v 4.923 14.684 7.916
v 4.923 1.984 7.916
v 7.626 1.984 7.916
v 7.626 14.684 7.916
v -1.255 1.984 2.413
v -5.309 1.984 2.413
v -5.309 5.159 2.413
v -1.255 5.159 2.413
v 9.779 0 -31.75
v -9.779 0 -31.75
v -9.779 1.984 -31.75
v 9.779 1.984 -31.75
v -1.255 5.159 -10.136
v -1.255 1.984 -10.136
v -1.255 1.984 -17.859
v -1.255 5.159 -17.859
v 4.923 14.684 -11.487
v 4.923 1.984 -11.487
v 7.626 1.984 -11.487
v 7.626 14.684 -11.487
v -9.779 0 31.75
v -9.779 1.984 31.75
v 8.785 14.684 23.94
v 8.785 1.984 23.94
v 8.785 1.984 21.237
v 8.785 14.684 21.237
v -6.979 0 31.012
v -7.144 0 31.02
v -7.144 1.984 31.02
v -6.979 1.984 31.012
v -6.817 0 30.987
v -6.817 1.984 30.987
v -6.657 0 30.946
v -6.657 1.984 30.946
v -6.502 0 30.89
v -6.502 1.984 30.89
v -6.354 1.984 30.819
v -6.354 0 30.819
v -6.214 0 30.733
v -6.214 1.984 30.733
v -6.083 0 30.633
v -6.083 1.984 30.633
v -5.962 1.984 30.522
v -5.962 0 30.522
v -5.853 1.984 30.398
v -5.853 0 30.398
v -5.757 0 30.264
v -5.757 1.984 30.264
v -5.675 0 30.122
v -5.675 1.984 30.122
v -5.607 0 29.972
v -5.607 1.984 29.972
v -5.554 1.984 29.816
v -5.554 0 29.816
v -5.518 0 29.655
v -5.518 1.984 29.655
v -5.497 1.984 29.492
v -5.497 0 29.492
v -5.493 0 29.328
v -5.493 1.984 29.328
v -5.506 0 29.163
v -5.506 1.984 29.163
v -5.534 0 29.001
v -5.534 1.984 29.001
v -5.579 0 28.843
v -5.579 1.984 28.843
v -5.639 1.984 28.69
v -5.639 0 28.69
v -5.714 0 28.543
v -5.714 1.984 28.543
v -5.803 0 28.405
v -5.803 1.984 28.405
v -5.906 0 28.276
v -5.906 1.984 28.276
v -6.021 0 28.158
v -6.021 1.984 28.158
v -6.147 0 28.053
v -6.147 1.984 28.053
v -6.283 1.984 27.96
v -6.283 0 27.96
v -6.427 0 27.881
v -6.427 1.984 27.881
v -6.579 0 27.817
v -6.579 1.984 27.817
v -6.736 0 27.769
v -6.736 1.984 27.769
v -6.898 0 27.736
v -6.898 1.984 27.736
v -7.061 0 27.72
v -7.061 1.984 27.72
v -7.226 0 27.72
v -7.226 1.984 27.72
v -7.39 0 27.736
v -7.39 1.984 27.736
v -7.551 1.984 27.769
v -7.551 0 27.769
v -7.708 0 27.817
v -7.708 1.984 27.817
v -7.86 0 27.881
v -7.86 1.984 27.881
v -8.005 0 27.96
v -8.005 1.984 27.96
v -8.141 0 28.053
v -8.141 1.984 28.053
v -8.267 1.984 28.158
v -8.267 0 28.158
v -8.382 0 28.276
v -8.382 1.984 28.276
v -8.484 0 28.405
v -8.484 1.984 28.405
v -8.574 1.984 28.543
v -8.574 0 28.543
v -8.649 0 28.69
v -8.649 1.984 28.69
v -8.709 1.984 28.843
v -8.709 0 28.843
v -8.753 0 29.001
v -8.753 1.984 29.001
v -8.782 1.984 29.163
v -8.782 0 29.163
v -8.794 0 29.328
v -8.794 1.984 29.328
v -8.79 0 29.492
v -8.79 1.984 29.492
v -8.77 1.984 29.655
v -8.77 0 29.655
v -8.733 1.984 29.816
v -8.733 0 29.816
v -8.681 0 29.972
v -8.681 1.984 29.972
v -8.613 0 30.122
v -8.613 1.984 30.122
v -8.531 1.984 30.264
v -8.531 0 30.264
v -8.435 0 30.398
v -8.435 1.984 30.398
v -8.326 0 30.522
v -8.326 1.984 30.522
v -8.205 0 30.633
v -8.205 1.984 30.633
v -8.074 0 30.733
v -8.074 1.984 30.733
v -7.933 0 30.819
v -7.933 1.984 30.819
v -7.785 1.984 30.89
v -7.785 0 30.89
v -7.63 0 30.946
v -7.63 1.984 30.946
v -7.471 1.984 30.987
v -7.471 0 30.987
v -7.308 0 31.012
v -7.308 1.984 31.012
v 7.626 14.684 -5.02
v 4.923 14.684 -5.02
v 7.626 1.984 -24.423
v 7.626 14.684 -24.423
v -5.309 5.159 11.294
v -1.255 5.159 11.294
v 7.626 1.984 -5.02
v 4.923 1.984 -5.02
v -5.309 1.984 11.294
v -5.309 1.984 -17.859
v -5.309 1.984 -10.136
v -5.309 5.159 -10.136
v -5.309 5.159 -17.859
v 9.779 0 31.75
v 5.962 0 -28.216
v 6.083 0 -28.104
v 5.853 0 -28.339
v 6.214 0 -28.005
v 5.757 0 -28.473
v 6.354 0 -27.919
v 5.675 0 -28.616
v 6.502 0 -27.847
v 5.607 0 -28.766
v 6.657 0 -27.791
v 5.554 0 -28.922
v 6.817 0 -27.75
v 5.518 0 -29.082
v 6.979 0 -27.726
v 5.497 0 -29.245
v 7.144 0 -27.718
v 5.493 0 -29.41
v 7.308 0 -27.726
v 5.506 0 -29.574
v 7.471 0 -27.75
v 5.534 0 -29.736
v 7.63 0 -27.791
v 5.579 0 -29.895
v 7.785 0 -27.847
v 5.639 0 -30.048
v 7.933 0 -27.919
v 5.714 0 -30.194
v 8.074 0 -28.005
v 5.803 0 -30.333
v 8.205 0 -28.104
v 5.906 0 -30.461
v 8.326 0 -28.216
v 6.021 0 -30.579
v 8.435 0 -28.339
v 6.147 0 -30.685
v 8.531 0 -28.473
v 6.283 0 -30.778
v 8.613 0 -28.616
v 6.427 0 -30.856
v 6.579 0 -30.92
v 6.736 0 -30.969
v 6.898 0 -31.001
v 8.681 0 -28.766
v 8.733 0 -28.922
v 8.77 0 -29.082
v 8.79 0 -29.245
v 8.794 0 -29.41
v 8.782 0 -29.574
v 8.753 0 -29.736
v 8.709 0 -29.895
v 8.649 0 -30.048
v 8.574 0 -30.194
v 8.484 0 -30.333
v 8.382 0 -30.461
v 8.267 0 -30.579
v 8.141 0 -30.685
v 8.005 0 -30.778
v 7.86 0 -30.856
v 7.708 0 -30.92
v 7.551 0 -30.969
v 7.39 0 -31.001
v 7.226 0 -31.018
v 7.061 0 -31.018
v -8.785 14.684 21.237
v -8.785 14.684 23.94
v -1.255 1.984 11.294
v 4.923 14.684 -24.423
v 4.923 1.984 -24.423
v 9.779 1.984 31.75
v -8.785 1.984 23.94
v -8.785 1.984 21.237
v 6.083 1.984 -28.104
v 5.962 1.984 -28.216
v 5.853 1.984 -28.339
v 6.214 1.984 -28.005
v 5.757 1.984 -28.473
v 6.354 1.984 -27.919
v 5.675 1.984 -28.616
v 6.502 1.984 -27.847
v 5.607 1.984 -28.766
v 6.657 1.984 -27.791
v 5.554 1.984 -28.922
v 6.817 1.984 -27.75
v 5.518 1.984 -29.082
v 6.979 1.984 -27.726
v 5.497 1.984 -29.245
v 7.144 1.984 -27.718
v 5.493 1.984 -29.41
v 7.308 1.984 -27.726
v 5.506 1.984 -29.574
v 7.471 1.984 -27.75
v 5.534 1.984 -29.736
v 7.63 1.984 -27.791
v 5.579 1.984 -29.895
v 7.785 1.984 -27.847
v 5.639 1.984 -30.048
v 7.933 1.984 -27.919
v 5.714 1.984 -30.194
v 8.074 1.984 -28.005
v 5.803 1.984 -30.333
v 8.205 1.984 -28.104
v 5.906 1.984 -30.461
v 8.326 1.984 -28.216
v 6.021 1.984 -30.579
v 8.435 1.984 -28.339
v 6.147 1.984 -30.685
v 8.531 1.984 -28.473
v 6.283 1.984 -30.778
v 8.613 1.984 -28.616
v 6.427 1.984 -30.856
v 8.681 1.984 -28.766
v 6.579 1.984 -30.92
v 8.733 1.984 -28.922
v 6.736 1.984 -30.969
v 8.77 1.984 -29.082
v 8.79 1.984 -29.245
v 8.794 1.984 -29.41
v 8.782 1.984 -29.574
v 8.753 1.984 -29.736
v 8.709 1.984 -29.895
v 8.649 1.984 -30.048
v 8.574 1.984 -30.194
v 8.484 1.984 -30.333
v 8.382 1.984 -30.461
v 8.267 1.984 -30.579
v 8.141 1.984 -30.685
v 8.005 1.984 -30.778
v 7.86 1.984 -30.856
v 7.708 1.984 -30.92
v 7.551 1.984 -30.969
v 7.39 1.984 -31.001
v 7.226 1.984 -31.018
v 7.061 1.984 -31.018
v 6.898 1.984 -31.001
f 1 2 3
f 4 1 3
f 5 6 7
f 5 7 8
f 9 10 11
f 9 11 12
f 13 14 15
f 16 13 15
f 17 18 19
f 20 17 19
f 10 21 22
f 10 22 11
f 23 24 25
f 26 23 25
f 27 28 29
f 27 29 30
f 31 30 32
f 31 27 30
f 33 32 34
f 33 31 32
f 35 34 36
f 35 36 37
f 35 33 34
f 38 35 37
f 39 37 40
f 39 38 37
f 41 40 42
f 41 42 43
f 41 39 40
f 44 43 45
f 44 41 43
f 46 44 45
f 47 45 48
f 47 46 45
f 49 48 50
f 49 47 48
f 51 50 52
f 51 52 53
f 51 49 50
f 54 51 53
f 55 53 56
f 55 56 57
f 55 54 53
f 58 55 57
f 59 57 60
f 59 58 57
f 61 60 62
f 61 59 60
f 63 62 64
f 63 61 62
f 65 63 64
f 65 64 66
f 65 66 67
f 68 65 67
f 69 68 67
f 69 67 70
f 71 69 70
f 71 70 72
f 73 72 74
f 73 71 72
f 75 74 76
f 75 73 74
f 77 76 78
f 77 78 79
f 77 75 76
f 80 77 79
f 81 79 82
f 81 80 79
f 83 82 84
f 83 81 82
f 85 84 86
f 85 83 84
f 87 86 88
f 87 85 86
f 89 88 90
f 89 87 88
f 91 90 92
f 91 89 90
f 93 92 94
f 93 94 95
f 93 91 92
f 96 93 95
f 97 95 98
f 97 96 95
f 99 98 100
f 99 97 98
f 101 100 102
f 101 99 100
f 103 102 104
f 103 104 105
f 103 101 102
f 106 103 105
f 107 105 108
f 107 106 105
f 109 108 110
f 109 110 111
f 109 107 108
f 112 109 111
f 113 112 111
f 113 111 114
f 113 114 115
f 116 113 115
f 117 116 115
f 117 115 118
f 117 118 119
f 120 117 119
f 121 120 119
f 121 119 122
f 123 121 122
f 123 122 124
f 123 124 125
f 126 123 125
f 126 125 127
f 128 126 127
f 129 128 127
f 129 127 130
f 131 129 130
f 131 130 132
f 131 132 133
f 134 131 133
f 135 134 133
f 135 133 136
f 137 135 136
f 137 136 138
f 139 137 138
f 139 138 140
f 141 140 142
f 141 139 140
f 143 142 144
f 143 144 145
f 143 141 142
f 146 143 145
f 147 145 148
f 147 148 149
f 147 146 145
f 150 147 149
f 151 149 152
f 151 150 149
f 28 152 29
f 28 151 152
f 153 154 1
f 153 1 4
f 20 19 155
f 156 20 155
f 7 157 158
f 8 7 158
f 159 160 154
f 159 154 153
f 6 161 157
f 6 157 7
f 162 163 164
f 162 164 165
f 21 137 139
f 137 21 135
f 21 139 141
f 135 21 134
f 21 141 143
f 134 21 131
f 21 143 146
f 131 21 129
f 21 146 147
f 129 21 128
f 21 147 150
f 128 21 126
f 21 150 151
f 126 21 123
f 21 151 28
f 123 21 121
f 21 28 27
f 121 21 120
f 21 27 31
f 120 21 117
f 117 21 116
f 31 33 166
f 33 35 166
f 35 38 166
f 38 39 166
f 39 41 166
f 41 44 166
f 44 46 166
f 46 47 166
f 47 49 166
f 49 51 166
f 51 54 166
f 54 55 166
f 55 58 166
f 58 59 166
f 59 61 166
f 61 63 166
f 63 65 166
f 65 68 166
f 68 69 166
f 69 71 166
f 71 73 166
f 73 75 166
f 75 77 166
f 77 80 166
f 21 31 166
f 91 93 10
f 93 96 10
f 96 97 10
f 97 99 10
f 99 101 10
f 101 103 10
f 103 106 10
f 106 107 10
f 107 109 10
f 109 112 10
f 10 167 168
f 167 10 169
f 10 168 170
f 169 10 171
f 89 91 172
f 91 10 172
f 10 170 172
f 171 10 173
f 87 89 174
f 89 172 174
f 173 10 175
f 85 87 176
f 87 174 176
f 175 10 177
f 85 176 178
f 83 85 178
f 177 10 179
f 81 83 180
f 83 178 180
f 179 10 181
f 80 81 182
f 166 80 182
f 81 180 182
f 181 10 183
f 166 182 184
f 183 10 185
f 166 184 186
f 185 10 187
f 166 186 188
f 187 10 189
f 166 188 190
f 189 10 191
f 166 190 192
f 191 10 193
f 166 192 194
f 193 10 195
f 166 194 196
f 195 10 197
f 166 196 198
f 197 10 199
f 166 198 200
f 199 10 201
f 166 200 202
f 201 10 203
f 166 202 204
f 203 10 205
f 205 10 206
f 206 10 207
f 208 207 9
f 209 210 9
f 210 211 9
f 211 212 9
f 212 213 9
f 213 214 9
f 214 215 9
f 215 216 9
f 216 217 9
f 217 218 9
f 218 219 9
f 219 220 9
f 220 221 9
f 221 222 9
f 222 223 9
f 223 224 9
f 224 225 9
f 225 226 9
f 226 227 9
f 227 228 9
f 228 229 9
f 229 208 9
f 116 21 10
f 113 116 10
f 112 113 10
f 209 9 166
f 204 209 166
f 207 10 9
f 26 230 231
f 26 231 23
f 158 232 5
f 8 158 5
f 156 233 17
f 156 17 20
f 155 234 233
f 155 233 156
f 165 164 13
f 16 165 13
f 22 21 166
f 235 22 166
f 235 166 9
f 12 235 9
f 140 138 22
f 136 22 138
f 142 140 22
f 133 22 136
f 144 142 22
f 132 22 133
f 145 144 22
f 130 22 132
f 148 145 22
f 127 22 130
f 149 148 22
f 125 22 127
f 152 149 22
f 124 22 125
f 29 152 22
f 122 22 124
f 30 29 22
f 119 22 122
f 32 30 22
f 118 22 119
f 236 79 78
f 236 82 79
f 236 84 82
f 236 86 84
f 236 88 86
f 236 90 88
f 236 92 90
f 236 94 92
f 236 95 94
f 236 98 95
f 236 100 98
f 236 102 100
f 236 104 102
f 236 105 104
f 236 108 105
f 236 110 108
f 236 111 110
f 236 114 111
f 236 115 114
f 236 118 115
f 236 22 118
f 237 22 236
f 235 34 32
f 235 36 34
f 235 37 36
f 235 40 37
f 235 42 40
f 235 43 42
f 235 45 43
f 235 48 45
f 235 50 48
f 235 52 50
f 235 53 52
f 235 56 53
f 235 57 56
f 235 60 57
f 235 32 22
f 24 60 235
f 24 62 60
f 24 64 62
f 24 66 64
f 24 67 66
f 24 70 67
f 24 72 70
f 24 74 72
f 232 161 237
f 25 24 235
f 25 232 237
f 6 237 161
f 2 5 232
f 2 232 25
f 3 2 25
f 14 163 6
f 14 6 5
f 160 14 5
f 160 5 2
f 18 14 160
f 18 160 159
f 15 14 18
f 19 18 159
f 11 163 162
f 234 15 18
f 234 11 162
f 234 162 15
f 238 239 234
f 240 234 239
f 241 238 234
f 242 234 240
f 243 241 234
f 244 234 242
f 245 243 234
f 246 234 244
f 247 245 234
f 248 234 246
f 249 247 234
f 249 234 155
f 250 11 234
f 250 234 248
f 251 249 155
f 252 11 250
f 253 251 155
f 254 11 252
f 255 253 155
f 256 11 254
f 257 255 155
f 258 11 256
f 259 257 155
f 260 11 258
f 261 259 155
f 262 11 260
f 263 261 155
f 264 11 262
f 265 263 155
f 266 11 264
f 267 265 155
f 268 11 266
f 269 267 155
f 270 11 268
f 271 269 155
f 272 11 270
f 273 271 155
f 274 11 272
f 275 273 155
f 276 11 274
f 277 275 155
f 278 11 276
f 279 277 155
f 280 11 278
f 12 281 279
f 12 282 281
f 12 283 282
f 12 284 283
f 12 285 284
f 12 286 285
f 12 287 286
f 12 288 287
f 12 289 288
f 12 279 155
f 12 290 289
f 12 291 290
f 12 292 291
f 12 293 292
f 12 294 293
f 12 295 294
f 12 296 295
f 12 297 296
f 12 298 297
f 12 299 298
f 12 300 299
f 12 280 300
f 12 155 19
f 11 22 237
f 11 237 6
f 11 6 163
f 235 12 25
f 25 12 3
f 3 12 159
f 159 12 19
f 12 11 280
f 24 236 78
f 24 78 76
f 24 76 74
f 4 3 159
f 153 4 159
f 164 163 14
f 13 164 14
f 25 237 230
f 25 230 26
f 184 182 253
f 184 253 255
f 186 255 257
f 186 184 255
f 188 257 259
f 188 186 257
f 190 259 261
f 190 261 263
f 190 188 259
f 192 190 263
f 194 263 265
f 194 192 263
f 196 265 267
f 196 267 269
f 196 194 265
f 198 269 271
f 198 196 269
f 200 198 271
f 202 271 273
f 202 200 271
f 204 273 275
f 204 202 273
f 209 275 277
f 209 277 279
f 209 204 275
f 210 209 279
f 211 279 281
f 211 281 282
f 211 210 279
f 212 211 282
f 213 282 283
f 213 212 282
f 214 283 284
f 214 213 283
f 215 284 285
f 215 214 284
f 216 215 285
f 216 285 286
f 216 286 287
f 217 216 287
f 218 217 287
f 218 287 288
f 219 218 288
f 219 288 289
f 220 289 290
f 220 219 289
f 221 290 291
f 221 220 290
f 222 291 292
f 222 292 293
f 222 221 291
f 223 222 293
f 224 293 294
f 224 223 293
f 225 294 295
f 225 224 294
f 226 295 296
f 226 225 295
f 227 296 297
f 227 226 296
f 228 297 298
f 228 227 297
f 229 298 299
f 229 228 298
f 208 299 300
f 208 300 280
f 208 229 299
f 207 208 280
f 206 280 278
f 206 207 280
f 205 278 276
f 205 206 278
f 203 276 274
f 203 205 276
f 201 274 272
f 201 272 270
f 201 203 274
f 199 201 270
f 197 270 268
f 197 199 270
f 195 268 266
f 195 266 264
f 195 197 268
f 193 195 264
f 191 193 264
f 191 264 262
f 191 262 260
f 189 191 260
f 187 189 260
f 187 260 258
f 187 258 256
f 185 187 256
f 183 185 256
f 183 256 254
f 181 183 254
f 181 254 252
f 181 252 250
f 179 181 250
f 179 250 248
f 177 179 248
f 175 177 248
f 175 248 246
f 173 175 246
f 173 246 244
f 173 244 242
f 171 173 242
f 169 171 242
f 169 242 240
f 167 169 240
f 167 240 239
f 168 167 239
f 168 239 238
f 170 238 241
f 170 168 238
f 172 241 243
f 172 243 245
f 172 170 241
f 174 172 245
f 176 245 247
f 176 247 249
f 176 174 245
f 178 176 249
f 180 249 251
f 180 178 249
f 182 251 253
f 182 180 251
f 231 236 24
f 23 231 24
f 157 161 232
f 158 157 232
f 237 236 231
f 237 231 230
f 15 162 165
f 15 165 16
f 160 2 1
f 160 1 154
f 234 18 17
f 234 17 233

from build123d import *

# Parameters (mm, degrees)
SKETCH1_W           = 19.558
SKETCH1_H           = 63.5
SKETCH1_R           = 1.651
BOSS_EXTRUDE1_DEPTH = 1.984375
SKETCH2_W           = 17.569023062
SKETCH2_H           = 2.702926625
SKETCH2_W_2         = 2.702926625
SKETCH2_H_2         = 12.935434562
BOSS_EXTRUDE3_DEPTH = 12.7
SKETCH2_3_W         = 4.054389937
SKETCH2_3_H         = 7.7226475
SKETCH2_3_H_2       = 8.881044625
BOSS_EXTRUDE4_DEPTH = 3.175


with BuildPart() as part:
    # Sketch1 → Boss-Extrude1 (new body)
    with BuildSketch(Plane(origin=(0, 0, 0), x_dir=(1, 0, 0), z_dir=(0, 1, 0))):
        Rectangle(SKETCH1_W, SKETCH1_H)
        with Locations((7.14375, 29.36875)):
            Circle(SKETCH1_R, mode=Mode.SUBTRACT)
        with Locations((-7.14375, -29.36875)):
            Circle(SKETCH1_R, mode=Mode.SUBTRACT)
    extrude(amount=BOSS_EXTRUDE1_DEPTH)

    # Sketch2 → Boss-Extrude3 (add)
    with BuildSketch(Plane(origin=(0, 1.984375, 0), x_dir=(1, 0, 0), z_dir=(0, 1, 0))):
        with Locations((0, -22.588743937)):
            Rectangle(SKETCH2_W, SKETCH2_H)
        with Locations((6.274651094, 17.955155437)):
            Rectangle(SKETCH2_W_2, SKETCH2_H_2)
        with Locations((6.274651094, -1.447996406)):
            Rectangle(SKETCH2_W_2, SKETCH2_H_2)
    extrude(amount=BOSS_EXTRUDE3_DEPTH)

    # Sketch2<3> → Boss-Extrude4 (add)
    with BuildSketch(Plane(origin=(0, 1.984375, 0), x_dir=(1, 0, 0), z_dir=(0, 1, 0))):
        with Locations((-3.282125188, 13.997298594)):
            Rectangle(SKETCH2_3_W, SKETCH2_3_H)
        with Locations((-3.282125188, -6.853849657)):
            Rectangle(SKETCH2_3_W, SKETCH2_3_H_2)
    extrude(amount=BOSS_EXTRUDE4_DEPTH)


solid = part.part
